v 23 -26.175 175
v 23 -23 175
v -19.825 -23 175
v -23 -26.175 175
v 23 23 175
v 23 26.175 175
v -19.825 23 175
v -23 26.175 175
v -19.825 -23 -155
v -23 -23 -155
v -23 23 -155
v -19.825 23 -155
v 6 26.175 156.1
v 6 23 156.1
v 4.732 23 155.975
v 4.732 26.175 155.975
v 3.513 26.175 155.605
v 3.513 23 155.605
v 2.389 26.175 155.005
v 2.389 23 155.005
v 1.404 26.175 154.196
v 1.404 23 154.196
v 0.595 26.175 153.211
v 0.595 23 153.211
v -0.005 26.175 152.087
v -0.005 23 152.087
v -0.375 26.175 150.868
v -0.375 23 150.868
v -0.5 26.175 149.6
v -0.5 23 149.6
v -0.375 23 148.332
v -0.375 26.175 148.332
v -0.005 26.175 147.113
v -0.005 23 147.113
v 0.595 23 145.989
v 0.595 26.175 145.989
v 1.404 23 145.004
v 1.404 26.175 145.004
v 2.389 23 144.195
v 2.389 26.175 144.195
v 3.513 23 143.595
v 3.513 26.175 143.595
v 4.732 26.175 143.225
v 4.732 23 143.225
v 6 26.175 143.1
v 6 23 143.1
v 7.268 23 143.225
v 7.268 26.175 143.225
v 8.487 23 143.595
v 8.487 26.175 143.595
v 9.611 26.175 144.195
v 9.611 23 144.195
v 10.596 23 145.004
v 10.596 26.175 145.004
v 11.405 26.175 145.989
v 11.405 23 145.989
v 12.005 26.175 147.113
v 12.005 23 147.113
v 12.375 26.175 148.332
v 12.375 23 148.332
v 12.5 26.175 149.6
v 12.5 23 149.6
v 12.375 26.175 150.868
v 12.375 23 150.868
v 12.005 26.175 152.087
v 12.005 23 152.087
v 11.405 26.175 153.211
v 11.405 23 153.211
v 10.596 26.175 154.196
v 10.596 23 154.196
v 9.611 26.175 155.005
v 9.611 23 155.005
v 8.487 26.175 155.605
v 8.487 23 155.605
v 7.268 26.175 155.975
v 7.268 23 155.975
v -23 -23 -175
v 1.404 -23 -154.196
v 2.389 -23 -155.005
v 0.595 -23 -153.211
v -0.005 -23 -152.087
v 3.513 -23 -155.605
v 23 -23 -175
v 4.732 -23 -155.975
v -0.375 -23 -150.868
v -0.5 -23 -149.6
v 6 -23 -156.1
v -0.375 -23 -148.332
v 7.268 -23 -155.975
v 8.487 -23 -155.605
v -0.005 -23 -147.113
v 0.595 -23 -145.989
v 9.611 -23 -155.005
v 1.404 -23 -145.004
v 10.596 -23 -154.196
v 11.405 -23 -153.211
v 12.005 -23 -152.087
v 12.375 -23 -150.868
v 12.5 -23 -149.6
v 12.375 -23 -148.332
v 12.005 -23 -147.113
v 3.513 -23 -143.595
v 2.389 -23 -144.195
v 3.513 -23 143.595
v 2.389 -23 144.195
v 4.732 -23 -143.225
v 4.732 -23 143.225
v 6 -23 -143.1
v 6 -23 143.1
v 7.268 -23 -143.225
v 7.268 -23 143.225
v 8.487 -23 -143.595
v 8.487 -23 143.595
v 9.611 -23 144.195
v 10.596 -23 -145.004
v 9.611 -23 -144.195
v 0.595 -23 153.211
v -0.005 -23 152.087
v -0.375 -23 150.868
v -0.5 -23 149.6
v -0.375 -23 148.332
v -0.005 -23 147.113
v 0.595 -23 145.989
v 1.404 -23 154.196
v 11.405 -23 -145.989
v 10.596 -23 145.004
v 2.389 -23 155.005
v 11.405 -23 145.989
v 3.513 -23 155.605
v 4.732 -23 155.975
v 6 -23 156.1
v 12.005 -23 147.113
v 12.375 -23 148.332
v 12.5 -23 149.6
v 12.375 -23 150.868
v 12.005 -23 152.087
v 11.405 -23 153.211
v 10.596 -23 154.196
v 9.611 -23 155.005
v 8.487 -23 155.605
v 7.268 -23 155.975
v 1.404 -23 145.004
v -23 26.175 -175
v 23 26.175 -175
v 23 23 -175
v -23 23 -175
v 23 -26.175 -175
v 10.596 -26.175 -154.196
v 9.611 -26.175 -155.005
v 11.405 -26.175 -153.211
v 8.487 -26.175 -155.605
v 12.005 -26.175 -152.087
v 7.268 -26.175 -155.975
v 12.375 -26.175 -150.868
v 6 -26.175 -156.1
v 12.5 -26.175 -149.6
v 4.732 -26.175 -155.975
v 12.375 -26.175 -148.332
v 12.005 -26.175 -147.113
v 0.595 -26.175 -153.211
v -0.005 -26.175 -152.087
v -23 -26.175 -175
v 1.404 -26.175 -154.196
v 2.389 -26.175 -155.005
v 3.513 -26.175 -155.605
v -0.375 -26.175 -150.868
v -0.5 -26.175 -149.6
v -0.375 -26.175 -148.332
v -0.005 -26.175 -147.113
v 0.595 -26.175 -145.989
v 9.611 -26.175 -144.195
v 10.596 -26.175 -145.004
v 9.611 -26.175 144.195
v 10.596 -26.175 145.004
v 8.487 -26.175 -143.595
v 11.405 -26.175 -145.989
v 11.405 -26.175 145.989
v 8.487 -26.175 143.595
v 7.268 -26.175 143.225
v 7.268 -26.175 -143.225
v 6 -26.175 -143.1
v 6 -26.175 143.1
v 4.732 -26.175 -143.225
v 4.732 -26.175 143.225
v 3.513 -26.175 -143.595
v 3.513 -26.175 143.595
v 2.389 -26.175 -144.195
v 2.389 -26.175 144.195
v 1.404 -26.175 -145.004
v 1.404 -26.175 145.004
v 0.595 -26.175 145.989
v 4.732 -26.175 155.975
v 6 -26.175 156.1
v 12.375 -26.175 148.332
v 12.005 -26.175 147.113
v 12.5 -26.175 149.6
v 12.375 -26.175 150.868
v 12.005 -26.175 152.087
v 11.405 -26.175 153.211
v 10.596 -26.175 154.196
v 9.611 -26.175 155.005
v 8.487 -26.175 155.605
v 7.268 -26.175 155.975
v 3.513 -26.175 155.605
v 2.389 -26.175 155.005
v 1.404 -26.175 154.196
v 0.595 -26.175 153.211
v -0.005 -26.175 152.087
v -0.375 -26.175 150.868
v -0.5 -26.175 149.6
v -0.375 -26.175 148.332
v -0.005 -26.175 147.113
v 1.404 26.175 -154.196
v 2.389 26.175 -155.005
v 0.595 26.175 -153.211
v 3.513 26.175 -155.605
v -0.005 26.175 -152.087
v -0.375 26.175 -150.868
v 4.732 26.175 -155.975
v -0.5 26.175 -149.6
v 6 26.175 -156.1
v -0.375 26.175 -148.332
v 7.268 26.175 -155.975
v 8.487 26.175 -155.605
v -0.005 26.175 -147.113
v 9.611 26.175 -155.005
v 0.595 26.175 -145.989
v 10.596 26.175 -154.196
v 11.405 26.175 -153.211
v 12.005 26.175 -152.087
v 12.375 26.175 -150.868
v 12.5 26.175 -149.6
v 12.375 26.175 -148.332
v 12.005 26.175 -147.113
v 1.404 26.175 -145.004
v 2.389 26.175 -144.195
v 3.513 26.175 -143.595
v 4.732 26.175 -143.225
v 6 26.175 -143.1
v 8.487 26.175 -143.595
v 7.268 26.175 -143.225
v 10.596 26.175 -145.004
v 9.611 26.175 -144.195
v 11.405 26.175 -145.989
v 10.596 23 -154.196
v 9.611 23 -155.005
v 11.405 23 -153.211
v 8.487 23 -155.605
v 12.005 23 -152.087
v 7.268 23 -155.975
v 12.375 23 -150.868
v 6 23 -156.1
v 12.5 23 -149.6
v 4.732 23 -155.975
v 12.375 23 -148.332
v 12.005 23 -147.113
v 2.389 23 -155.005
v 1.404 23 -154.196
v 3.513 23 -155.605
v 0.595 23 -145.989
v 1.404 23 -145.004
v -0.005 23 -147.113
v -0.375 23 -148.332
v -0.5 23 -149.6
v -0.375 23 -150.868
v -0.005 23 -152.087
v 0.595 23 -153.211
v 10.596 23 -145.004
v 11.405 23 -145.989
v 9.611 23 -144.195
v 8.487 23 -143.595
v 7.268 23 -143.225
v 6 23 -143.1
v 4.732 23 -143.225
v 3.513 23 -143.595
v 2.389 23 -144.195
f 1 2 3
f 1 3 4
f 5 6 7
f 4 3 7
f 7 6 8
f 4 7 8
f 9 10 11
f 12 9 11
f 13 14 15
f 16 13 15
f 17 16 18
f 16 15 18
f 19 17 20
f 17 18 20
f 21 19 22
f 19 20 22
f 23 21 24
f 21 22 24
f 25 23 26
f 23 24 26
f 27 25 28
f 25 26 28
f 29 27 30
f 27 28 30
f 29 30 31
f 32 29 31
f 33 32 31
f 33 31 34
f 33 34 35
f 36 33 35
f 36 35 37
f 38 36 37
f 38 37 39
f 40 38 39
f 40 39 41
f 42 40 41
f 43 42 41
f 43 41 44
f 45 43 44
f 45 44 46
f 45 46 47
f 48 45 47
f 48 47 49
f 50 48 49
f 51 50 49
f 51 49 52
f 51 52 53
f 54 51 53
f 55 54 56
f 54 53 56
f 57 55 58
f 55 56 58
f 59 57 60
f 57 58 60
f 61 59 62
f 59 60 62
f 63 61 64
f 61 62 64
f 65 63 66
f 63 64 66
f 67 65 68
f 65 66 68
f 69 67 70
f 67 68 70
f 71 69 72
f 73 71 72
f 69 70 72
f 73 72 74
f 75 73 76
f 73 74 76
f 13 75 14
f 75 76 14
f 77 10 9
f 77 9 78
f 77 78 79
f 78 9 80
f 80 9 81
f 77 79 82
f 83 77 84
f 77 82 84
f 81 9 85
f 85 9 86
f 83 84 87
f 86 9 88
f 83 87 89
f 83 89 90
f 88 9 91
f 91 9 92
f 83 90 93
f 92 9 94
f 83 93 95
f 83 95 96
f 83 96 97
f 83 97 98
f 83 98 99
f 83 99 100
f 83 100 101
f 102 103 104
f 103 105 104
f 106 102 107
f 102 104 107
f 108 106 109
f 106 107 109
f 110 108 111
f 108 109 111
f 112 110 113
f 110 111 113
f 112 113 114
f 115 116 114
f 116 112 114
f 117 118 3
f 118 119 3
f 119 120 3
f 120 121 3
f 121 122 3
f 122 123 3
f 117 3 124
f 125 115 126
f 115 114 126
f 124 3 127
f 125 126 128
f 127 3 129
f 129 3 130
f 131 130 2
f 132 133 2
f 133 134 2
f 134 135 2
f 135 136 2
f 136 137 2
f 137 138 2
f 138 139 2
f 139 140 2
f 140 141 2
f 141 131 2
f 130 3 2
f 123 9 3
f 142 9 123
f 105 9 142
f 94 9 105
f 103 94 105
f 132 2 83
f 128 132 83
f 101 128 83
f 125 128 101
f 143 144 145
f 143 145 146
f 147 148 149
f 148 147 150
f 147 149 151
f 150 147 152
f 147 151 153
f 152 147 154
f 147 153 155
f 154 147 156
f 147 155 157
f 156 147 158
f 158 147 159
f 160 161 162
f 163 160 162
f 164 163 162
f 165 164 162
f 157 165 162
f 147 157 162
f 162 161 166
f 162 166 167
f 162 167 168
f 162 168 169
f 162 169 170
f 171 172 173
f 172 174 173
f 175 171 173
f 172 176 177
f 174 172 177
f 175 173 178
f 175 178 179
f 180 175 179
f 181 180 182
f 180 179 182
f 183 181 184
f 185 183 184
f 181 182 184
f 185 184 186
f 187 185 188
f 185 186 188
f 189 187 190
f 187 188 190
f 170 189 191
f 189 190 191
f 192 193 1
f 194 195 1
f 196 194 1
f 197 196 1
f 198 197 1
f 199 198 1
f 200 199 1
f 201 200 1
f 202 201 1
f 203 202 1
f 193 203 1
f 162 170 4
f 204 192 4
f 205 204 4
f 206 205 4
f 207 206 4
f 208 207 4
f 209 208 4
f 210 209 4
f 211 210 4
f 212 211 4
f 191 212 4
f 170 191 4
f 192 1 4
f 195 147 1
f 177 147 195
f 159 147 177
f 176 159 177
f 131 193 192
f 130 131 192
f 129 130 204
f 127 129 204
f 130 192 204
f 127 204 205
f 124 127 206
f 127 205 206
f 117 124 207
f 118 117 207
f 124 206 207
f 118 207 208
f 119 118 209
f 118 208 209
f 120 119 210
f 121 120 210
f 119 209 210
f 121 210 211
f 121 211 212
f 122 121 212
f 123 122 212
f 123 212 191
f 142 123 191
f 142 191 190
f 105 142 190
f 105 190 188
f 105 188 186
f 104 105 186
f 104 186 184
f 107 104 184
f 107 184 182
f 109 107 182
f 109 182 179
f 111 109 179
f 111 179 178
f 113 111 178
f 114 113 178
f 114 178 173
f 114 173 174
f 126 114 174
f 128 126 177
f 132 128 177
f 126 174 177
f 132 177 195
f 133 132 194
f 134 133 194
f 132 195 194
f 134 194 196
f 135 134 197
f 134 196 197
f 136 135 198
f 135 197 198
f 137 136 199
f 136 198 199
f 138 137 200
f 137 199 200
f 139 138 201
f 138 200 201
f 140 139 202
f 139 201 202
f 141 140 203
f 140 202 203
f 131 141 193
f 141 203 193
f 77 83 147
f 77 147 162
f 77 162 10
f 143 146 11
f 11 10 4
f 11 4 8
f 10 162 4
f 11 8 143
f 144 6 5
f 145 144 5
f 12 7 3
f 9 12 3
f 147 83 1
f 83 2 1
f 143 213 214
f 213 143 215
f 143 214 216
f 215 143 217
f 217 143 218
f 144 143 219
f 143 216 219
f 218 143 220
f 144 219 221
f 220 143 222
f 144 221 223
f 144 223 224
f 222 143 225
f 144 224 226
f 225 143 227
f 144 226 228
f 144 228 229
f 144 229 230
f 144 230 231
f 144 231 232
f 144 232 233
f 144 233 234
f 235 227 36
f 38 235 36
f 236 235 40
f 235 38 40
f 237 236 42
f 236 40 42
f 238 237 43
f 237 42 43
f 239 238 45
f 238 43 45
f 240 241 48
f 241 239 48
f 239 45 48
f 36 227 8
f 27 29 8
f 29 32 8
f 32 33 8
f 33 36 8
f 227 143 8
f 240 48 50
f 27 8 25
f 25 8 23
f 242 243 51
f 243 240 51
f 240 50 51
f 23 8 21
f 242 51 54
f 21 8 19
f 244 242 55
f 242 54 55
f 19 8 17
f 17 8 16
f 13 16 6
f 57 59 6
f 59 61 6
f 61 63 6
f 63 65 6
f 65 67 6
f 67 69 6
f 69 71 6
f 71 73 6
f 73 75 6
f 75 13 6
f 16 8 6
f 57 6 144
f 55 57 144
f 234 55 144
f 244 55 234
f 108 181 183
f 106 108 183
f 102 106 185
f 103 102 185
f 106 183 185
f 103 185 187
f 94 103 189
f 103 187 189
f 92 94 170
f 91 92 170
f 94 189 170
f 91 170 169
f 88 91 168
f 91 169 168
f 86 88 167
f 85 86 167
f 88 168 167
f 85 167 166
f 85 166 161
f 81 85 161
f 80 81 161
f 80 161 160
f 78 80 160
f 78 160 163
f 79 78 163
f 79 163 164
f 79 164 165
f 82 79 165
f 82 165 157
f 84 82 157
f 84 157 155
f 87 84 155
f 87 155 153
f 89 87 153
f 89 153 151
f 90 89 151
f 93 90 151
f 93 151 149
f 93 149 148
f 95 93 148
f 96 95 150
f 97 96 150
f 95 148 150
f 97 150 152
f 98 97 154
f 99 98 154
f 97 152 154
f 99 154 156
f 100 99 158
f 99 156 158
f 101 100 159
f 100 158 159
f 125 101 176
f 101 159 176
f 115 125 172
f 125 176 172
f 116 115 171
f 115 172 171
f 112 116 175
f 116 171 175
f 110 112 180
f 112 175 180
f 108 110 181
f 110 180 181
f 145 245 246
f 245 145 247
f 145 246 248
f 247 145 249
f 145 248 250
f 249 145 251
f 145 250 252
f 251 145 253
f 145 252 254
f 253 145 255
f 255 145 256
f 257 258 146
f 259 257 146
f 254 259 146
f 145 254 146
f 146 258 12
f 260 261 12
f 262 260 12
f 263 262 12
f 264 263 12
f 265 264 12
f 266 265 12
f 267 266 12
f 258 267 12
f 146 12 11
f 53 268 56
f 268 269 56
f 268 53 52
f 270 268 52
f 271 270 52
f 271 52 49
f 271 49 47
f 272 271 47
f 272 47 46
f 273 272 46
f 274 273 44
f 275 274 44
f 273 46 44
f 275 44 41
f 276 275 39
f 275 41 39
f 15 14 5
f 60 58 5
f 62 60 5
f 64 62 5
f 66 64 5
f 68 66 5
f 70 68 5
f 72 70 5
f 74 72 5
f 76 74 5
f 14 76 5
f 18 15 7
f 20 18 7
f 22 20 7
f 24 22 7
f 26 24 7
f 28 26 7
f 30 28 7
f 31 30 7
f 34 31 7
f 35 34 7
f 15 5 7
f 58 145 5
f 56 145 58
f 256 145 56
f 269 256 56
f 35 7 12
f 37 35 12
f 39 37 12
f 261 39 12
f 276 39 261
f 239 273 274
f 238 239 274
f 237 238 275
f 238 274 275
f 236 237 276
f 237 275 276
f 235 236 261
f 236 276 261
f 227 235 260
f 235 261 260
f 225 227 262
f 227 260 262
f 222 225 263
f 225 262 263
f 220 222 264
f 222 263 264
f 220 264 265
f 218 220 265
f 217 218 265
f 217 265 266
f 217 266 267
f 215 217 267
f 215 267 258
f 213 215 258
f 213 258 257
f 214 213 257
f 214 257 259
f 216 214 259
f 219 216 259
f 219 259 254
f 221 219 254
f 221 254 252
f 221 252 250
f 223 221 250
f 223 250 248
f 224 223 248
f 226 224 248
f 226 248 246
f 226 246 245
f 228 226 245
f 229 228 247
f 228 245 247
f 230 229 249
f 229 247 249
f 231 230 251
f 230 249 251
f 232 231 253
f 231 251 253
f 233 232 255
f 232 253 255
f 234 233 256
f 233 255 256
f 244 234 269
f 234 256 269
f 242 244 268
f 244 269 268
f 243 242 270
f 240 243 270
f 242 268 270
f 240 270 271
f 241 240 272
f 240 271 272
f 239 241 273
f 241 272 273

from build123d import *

# Parameters (mm, degrees)
SALIENTE_EXTRUIR1_DEPTH = 175
CROQUIS2_R              = 6.5
CORTAR_EXTRUIR1_DEPTH   = 300
CROQUIS3_W              = 20
CROQUIS3_H              = 46
CORTAR_EXTRUIR2_DEPTH   = 10


with BuildPart() as part:
    # Croquis1 → Saliente-Extruir1 (new, symmetric)
    with BuildSketch(Plane.XY):
        Polygon((23, 23), (-19.825, 23), (-19.825, -23), (23, -23), (23, -26.175), (-23, -26.175), (-23, 26.175), (23, 26.175), align=None)
    extrude(amount=SALIENTE_EXTRUIR1_DEPTH, both=True)

    # Croquis2 → Cortar-Extruir1 (cut)
    with BuildSketch(Plane.XZ.offset(26.175)):
        with Locations(Location((6, 149.6, 0), (0, 0, 90))):
            Circle(CROQUIS2_R)
        with Locations(Location((6, -149.6, 0), (0, 0, 90))):
            Circle(CROQUIS2_R)
    extrude(amount=-CORTAR_EXTRUIR1_DEPTH, mode=Mode.SUBTRACT)

    # Croquis3 → Cortar-Extruir2 (cut)
    with BuildSketch(Plane.ZY.offset(23)):
        with Locations((-165, 0)):
            Rectangle(CROQUIS3_W, CROQUIS3_H)
    extrude(amount=-CORTAR_EXTRUIR2_DEPTH, mode=Mode.SUBTRACT)


solid = part.part
